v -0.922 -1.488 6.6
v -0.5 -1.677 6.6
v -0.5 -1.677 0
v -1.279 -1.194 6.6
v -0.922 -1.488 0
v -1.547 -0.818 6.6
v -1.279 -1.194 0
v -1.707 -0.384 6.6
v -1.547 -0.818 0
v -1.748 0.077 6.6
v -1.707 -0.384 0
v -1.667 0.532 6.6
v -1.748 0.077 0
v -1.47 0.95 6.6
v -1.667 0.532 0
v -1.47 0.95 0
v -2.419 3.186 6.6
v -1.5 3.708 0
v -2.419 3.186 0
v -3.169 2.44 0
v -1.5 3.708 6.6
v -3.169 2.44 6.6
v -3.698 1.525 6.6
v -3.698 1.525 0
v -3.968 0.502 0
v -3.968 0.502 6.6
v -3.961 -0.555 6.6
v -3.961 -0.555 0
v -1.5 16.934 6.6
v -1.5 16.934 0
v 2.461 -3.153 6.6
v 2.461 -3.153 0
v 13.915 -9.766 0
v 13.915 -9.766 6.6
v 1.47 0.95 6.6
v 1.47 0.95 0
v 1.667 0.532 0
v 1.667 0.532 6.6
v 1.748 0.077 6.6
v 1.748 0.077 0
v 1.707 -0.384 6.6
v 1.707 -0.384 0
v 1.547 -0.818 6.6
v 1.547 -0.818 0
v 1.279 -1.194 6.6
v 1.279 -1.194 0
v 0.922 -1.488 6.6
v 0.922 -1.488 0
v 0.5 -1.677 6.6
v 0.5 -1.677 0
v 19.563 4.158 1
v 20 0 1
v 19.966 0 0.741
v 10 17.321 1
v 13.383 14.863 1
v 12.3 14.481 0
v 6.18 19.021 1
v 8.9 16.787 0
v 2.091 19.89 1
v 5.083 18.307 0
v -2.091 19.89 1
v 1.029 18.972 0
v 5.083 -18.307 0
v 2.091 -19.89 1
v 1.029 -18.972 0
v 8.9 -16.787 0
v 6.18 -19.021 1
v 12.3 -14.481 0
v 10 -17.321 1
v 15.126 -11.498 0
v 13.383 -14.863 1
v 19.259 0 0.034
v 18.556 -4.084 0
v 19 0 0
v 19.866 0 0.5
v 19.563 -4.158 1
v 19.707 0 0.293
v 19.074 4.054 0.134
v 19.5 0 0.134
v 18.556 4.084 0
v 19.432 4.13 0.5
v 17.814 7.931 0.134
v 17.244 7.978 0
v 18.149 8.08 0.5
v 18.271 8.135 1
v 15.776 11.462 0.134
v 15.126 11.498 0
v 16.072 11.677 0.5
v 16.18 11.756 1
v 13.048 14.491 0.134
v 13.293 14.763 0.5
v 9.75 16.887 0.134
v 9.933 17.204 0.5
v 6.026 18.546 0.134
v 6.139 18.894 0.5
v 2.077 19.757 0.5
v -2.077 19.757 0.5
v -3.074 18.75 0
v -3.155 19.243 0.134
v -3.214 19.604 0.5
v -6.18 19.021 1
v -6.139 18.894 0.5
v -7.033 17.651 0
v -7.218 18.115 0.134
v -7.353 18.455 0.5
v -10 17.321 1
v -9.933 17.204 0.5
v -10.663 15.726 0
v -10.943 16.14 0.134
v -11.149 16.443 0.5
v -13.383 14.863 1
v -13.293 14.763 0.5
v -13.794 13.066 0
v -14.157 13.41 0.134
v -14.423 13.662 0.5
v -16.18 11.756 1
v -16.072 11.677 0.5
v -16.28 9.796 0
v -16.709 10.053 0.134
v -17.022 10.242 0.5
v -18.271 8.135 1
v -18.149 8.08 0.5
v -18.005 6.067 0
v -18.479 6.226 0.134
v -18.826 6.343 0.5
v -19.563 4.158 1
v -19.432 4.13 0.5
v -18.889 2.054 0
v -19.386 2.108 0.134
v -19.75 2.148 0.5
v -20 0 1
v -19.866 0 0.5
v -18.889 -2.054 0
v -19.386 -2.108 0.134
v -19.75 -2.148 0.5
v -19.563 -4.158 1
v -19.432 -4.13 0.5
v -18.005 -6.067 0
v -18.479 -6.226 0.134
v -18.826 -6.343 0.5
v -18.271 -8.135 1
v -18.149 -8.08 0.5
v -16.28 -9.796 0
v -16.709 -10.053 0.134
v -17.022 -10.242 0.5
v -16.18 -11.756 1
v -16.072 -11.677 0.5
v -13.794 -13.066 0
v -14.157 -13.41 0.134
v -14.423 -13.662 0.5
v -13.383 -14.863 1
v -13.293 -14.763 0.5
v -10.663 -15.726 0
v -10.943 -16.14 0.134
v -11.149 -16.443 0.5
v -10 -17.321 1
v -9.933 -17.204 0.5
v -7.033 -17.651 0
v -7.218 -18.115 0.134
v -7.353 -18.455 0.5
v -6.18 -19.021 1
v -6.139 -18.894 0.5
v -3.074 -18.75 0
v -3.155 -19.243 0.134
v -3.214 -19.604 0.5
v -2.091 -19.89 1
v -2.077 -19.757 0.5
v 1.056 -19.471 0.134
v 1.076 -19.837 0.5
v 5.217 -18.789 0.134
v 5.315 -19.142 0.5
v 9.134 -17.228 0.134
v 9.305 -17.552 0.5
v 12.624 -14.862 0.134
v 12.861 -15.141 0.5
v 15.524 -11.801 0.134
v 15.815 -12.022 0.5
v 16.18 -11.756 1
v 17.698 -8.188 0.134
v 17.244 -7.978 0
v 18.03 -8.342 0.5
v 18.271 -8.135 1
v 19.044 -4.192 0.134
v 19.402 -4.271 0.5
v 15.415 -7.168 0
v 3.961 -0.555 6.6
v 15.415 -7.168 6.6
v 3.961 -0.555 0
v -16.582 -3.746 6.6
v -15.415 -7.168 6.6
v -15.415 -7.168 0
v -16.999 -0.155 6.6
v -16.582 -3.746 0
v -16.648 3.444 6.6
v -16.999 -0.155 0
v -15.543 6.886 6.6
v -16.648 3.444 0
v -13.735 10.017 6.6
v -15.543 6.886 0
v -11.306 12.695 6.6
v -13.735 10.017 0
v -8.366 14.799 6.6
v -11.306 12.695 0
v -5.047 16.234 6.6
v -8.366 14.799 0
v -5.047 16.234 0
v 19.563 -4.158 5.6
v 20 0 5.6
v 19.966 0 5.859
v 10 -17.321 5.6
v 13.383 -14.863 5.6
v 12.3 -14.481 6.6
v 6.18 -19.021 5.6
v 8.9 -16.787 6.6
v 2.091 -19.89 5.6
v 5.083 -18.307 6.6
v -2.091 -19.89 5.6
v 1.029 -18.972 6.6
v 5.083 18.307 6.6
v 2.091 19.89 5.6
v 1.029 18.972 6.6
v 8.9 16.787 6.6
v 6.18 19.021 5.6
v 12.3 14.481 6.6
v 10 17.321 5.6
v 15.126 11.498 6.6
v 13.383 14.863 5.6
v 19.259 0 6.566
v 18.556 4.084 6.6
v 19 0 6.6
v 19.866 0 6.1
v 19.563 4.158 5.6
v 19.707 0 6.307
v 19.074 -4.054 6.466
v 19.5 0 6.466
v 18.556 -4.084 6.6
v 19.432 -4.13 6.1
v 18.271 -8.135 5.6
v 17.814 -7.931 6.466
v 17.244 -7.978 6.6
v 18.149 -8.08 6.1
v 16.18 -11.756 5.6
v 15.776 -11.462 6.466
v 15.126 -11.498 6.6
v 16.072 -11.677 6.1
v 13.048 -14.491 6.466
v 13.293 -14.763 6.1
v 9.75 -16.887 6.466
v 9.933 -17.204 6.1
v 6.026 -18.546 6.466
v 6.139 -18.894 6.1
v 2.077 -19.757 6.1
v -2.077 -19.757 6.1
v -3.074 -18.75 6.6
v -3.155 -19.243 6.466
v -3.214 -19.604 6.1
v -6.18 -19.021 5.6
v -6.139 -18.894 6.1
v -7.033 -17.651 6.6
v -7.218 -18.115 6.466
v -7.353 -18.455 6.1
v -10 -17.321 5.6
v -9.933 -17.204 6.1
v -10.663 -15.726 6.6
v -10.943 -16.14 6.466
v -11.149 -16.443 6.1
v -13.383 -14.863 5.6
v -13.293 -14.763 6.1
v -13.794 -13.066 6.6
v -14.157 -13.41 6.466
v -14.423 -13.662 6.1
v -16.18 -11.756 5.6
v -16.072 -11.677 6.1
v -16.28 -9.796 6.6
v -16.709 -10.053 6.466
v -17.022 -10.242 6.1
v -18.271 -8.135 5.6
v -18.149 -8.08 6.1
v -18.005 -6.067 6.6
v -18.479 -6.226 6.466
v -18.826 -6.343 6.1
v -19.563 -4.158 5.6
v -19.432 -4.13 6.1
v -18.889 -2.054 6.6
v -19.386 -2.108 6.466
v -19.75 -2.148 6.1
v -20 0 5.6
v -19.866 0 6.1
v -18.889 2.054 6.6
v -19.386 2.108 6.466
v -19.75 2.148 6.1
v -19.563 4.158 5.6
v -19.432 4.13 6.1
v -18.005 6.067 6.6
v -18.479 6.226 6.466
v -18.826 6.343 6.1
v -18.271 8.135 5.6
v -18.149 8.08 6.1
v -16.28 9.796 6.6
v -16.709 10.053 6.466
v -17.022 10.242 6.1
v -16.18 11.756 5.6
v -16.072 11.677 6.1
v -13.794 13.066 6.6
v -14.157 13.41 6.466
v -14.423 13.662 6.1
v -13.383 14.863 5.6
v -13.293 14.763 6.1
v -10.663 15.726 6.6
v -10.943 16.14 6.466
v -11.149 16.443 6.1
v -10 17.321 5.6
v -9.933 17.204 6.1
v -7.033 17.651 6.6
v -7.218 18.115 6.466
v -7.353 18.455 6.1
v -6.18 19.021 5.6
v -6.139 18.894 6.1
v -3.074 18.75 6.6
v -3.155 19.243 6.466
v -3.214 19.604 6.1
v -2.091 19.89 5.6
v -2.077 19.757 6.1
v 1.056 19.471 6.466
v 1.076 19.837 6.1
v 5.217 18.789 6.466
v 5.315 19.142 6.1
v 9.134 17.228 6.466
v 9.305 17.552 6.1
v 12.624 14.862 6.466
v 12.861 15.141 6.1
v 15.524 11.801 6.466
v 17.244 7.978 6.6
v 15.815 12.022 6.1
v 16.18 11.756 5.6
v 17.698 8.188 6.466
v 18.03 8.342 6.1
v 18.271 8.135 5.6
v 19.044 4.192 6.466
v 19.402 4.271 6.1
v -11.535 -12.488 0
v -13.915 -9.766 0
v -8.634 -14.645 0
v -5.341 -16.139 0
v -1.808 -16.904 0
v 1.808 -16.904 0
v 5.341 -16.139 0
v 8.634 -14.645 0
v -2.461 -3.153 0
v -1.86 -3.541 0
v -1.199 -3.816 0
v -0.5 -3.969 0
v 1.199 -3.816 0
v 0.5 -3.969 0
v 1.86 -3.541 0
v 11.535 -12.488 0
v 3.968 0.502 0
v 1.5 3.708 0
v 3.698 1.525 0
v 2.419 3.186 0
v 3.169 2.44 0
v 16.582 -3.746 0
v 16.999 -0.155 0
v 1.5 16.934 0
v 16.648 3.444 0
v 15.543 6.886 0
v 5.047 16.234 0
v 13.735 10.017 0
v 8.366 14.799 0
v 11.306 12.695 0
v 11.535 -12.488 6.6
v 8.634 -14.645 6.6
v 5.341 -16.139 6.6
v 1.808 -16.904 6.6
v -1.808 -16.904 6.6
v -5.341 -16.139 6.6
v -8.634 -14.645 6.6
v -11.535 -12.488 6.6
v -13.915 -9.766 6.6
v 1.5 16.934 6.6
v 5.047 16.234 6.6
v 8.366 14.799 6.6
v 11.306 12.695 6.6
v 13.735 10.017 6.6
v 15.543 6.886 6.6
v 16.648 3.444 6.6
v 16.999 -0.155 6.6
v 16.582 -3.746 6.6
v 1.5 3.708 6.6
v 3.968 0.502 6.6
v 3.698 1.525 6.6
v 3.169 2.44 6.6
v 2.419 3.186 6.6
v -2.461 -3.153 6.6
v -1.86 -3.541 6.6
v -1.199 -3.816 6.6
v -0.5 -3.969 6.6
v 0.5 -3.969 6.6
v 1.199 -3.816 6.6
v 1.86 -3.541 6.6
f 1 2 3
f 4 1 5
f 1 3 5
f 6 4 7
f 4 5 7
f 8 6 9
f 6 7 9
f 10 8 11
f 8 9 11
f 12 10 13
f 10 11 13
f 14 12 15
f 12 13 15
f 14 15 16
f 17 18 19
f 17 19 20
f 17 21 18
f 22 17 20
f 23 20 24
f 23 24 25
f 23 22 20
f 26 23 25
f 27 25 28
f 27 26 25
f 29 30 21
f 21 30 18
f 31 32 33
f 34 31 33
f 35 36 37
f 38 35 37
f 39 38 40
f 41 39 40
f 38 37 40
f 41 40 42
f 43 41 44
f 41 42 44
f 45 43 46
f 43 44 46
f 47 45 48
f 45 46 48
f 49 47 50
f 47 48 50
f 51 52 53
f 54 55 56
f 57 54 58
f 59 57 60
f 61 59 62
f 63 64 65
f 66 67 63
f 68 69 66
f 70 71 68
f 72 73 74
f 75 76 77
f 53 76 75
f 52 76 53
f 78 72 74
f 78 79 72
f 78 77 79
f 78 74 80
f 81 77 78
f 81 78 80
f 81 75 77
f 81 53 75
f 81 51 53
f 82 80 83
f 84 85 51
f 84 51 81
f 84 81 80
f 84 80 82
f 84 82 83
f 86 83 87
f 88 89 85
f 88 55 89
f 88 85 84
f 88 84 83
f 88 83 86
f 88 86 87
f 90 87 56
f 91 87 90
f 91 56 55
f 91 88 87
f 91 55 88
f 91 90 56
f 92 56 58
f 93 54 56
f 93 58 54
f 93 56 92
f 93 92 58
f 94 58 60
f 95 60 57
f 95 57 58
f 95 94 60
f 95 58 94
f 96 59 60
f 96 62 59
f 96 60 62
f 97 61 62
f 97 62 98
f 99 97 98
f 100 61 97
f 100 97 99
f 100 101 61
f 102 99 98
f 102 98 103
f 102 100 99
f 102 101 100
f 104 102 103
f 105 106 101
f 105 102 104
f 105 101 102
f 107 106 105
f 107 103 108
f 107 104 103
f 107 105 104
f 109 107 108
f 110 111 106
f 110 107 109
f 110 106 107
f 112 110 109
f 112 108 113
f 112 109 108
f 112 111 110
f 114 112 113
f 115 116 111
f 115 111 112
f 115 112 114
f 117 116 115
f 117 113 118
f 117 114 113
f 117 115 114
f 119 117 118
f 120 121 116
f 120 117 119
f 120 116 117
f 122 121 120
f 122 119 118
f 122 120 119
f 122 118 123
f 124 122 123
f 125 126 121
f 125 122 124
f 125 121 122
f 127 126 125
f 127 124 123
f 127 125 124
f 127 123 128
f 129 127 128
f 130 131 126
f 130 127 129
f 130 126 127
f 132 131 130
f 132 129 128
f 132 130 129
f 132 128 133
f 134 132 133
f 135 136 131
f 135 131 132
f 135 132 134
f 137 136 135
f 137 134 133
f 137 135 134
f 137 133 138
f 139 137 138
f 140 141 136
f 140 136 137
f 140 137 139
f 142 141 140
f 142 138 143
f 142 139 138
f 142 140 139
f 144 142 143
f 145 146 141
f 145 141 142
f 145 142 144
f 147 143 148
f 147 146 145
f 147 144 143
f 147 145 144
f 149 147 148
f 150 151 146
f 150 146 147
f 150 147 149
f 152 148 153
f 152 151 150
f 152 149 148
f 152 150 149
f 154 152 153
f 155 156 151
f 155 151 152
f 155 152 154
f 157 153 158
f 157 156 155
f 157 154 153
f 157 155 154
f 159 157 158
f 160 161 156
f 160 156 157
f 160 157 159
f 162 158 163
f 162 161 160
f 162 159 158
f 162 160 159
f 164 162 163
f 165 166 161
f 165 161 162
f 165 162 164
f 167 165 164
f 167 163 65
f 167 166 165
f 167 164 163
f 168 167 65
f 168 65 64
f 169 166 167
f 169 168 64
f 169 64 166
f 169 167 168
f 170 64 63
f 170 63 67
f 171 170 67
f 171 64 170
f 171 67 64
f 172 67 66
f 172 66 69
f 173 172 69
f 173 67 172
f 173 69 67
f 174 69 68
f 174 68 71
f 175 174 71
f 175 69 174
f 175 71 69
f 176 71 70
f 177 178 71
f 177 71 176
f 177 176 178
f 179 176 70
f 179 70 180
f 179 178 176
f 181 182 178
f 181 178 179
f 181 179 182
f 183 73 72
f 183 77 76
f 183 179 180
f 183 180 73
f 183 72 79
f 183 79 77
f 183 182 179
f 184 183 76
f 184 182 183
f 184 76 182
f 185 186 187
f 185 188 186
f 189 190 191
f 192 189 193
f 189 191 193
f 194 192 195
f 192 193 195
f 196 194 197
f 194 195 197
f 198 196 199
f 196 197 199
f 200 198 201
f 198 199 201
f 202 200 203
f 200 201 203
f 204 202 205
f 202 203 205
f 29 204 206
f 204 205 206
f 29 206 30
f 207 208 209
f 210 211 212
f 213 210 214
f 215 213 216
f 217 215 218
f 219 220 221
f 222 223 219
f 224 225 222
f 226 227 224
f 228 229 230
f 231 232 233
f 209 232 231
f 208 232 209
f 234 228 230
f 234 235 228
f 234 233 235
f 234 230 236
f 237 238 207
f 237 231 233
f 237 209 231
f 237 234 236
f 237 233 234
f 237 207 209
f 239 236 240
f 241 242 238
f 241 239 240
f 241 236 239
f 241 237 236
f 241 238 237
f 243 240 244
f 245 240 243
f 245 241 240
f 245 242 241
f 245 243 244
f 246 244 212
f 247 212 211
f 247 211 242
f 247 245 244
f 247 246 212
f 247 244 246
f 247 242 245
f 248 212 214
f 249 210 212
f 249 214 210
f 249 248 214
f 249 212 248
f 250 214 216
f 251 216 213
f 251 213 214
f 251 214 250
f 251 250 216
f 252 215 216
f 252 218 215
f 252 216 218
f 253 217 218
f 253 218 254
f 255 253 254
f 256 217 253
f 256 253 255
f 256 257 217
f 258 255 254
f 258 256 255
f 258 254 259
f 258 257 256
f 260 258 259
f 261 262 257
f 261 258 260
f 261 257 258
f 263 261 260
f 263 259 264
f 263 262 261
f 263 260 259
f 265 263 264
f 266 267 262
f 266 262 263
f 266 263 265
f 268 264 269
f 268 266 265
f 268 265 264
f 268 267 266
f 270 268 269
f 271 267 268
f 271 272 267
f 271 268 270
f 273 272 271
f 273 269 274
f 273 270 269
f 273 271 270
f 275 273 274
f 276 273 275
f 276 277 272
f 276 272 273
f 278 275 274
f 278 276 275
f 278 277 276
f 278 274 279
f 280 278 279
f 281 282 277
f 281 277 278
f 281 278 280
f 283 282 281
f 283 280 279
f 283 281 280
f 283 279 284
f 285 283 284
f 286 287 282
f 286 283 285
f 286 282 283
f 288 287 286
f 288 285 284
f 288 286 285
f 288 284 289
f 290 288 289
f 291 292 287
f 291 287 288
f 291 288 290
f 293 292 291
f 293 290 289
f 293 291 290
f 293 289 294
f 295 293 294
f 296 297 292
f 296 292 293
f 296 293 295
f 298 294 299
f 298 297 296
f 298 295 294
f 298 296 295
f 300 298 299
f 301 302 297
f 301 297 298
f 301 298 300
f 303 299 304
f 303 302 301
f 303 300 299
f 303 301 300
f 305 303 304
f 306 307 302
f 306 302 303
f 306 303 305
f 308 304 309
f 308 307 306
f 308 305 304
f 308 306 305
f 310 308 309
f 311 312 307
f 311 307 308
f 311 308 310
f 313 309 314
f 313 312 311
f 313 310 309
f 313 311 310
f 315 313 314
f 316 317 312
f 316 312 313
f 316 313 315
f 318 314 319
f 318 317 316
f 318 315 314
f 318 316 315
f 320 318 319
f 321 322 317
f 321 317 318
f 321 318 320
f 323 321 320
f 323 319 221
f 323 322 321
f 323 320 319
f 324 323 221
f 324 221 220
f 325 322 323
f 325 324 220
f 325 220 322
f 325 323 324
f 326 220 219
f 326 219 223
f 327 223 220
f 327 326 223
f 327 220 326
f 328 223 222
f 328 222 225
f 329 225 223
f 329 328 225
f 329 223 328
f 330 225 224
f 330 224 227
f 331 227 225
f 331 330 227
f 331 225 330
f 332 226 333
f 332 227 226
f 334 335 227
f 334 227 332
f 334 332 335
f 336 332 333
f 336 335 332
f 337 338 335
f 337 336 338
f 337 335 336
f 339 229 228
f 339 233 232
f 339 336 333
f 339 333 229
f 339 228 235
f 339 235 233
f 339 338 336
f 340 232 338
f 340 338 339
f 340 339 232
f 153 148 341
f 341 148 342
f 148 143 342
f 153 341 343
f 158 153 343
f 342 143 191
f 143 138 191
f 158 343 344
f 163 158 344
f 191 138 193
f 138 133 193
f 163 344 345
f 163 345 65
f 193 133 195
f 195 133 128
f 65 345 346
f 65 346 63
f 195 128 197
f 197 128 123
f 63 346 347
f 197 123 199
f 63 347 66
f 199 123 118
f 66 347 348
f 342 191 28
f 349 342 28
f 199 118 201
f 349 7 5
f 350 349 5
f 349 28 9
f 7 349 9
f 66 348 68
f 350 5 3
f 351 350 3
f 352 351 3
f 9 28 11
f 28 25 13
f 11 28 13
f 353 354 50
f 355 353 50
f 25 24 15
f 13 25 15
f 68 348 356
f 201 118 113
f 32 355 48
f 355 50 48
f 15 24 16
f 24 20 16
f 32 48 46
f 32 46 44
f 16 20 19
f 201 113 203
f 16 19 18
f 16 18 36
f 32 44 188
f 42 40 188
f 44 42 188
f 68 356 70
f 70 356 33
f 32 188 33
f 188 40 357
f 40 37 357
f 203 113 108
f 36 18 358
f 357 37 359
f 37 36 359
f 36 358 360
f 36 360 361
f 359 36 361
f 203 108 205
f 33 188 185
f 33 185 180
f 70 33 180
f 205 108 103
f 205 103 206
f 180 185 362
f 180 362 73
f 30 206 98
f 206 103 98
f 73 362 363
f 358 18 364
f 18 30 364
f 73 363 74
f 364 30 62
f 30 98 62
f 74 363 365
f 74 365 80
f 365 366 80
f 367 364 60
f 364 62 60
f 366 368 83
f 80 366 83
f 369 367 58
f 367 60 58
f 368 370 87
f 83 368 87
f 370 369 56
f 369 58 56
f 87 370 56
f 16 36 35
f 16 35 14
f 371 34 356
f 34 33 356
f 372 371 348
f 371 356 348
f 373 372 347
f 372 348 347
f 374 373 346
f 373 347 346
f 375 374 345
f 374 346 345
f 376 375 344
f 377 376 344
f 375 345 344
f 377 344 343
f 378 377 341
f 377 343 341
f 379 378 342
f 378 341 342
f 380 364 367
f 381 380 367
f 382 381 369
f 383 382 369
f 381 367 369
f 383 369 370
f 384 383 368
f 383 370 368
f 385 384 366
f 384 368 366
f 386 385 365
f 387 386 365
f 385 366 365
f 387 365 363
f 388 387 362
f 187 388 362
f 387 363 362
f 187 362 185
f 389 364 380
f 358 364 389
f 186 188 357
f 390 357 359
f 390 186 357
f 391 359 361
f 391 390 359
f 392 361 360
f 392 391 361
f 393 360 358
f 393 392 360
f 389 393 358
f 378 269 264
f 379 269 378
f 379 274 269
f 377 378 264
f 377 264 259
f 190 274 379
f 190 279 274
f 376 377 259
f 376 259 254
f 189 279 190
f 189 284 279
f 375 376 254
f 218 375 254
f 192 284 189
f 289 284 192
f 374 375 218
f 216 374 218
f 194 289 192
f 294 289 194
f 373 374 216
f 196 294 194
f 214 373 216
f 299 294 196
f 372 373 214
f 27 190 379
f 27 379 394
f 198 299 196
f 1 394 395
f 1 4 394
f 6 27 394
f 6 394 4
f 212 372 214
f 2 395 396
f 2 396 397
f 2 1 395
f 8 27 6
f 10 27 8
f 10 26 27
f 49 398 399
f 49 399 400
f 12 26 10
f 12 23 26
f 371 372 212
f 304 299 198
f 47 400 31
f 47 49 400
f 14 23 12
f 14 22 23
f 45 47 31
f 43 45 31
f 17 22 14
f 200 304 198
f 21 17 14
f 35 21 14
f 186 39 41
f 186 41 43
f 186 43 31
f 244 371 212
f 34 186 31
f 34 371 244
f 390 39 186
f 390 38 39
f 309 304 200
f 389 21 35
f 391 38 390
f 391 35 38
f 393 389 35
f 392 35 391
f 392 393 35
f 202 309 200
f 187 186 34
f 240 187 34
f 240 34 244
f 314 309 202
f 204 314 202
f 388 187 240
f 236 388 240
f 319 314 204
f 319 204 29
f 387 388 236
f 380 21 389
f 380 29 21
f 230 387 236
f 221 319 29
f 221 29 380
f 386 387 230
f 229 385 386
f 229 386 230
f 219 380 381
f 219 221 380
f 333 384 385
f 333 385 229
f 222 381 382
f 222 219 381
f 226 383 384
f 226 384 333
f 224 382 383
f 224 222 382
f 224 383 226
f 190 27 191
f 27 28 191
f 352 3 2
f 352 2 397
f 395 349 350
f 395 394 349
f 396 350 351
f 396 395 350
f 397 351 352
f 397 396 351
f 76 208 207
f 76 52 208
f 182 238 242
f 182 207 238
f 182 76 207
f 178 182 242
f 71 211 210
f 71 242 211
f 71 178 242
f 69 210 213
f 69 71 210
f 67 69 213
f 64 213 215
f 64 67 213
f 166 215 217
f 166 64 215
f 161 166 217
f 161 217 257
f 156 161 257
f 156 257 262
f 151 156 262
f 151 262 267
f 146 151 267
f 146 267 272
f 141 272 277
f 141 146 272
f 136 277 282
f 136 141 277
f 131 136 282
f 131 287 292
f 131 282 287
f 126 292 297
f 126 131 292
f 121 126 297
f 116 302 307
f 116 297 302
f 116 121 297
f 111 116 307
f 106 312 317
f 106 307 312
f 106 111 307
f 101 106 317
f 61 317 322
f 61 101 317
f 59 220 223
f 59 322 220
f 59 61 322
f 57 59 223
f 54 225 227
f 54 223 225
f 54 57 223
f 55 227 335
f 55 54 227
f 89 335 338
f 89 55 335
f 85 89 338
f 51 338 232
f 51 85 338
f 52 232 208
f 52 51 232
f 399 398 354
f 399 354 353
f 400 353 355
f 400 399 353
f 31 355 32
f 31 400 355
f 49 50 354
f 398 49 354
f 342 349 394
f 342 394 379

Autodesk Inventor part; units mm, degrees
ref_plane "YZ Plane" through (0, 0, 0) normal (1, 0, 0) x (0, 1, 0)
ref_plane "XZ Plane" through (0, 0, 0) normal (0, 1, 0) x (-1, 0, 0)
ref_plane "XY Plane" through (0, 0, 0) normal (0, 0, 1) x (1, 0, 0)
sketch "Sketch1" plane through (0, 0, 0) normal (0, 0, 1) x (1, 0, 0)
  circle A0 centre (0, 0) radius 20
  dimension "d0" = 40
extrude "Extrusion1" add sketch "Sketch1" along normal blind 6.6
sketch "Sketch3" plane through (0, 0, 0) normal (0, 0, -1) x (-1, 0, 0)
  circle A0 centre (0, 0) radius 17
  line L0 (0, 17) -> (0, 0)
  line L1 (0, 0) -> (14.7224, -8.5)
  line L2 (0, 0) -> (-14.7224, -8.5)
  line L3 (0, 0) -> (17, 0) construction
  line L4 (1.5, 16.9337) -> (1.5, 0.866)
  line L5 (-1.5, 16.9337) -> (-1.5, 0.866)
  line L6 (-1.5, 0.866) -> (-15.415, -7.1678)
  line L7 (0, -1.7321) -> (-13.915, -9.7659)
  line L8 (1.5, 0.866) -> (15.415, -7.1678)
  line L9 (0, -1.7321) -> (13.915, -9.7659)
  dimension "d6" = 34
  dimension "d7" = 120
  dimension "d8" = 150
  dimension "d9" = 1.5
  dimension "d10" = 1.5
  dimension "d11" = 1.5
  dimension "d12" = 1.5
  dimension "d13" = 1.5
  dimension "d14" = 1.5
extrude "Extrusion3" cut sketch "Sketch3" against normal up to surface (6.6 mm away) contours A0 L8 L4 | L5 L6 A0 | A0 L7 L9
sketch "Sketch5" plane through (0, 0, 6.6) normal (0, 0, 1) x (1, 0, 0)
  circle A0 centre (0, 0) radius 4
  dimension "d20" = 8
extrude "Extrusion5" add sketch "Sketch5" against normal blind 6.6
sketch "Sketch6" plane through (0, 0, 0) normal (0, 0, -1) x (-1, 0, 0)
  circle A0 centre (0, 0) radius 1.75
  line L0 (0, -1.75) -> (0, -4)
  arc A1 (-2.4613, -3.1531) -> (2.4613, -3.1531) centre (0, 0) ccw projected
  line L1 (0.5, -1.6771) -> (0.5, -3.9686)
  line L2 (-0.5, -1.6771) -> (-0.5, -3.9686)
  line L3 (-1.4697, 0.95) -> (1.4697, 0.95)
  point P0 (0.0845, 0.95)
  dimension "d23" = 3.5
  dimension "d24" = 0.5
  dimension "d25" = 0.5
  dimension "d29" = 2.7
extrude "Extrusion6" cut sketch "Sketch6" against normal up to surface (6.6 mm away) contours A0 L3 | L1 A1 L0 A0 | L0 A1 L2 A0 picked at (-0.299, -0.0924)
fillet "Arredondamento1" radius 1 2 edges at (-20, 0, 6.6) (-20, 0, 0)
properties part number "wheel35mmV1"
